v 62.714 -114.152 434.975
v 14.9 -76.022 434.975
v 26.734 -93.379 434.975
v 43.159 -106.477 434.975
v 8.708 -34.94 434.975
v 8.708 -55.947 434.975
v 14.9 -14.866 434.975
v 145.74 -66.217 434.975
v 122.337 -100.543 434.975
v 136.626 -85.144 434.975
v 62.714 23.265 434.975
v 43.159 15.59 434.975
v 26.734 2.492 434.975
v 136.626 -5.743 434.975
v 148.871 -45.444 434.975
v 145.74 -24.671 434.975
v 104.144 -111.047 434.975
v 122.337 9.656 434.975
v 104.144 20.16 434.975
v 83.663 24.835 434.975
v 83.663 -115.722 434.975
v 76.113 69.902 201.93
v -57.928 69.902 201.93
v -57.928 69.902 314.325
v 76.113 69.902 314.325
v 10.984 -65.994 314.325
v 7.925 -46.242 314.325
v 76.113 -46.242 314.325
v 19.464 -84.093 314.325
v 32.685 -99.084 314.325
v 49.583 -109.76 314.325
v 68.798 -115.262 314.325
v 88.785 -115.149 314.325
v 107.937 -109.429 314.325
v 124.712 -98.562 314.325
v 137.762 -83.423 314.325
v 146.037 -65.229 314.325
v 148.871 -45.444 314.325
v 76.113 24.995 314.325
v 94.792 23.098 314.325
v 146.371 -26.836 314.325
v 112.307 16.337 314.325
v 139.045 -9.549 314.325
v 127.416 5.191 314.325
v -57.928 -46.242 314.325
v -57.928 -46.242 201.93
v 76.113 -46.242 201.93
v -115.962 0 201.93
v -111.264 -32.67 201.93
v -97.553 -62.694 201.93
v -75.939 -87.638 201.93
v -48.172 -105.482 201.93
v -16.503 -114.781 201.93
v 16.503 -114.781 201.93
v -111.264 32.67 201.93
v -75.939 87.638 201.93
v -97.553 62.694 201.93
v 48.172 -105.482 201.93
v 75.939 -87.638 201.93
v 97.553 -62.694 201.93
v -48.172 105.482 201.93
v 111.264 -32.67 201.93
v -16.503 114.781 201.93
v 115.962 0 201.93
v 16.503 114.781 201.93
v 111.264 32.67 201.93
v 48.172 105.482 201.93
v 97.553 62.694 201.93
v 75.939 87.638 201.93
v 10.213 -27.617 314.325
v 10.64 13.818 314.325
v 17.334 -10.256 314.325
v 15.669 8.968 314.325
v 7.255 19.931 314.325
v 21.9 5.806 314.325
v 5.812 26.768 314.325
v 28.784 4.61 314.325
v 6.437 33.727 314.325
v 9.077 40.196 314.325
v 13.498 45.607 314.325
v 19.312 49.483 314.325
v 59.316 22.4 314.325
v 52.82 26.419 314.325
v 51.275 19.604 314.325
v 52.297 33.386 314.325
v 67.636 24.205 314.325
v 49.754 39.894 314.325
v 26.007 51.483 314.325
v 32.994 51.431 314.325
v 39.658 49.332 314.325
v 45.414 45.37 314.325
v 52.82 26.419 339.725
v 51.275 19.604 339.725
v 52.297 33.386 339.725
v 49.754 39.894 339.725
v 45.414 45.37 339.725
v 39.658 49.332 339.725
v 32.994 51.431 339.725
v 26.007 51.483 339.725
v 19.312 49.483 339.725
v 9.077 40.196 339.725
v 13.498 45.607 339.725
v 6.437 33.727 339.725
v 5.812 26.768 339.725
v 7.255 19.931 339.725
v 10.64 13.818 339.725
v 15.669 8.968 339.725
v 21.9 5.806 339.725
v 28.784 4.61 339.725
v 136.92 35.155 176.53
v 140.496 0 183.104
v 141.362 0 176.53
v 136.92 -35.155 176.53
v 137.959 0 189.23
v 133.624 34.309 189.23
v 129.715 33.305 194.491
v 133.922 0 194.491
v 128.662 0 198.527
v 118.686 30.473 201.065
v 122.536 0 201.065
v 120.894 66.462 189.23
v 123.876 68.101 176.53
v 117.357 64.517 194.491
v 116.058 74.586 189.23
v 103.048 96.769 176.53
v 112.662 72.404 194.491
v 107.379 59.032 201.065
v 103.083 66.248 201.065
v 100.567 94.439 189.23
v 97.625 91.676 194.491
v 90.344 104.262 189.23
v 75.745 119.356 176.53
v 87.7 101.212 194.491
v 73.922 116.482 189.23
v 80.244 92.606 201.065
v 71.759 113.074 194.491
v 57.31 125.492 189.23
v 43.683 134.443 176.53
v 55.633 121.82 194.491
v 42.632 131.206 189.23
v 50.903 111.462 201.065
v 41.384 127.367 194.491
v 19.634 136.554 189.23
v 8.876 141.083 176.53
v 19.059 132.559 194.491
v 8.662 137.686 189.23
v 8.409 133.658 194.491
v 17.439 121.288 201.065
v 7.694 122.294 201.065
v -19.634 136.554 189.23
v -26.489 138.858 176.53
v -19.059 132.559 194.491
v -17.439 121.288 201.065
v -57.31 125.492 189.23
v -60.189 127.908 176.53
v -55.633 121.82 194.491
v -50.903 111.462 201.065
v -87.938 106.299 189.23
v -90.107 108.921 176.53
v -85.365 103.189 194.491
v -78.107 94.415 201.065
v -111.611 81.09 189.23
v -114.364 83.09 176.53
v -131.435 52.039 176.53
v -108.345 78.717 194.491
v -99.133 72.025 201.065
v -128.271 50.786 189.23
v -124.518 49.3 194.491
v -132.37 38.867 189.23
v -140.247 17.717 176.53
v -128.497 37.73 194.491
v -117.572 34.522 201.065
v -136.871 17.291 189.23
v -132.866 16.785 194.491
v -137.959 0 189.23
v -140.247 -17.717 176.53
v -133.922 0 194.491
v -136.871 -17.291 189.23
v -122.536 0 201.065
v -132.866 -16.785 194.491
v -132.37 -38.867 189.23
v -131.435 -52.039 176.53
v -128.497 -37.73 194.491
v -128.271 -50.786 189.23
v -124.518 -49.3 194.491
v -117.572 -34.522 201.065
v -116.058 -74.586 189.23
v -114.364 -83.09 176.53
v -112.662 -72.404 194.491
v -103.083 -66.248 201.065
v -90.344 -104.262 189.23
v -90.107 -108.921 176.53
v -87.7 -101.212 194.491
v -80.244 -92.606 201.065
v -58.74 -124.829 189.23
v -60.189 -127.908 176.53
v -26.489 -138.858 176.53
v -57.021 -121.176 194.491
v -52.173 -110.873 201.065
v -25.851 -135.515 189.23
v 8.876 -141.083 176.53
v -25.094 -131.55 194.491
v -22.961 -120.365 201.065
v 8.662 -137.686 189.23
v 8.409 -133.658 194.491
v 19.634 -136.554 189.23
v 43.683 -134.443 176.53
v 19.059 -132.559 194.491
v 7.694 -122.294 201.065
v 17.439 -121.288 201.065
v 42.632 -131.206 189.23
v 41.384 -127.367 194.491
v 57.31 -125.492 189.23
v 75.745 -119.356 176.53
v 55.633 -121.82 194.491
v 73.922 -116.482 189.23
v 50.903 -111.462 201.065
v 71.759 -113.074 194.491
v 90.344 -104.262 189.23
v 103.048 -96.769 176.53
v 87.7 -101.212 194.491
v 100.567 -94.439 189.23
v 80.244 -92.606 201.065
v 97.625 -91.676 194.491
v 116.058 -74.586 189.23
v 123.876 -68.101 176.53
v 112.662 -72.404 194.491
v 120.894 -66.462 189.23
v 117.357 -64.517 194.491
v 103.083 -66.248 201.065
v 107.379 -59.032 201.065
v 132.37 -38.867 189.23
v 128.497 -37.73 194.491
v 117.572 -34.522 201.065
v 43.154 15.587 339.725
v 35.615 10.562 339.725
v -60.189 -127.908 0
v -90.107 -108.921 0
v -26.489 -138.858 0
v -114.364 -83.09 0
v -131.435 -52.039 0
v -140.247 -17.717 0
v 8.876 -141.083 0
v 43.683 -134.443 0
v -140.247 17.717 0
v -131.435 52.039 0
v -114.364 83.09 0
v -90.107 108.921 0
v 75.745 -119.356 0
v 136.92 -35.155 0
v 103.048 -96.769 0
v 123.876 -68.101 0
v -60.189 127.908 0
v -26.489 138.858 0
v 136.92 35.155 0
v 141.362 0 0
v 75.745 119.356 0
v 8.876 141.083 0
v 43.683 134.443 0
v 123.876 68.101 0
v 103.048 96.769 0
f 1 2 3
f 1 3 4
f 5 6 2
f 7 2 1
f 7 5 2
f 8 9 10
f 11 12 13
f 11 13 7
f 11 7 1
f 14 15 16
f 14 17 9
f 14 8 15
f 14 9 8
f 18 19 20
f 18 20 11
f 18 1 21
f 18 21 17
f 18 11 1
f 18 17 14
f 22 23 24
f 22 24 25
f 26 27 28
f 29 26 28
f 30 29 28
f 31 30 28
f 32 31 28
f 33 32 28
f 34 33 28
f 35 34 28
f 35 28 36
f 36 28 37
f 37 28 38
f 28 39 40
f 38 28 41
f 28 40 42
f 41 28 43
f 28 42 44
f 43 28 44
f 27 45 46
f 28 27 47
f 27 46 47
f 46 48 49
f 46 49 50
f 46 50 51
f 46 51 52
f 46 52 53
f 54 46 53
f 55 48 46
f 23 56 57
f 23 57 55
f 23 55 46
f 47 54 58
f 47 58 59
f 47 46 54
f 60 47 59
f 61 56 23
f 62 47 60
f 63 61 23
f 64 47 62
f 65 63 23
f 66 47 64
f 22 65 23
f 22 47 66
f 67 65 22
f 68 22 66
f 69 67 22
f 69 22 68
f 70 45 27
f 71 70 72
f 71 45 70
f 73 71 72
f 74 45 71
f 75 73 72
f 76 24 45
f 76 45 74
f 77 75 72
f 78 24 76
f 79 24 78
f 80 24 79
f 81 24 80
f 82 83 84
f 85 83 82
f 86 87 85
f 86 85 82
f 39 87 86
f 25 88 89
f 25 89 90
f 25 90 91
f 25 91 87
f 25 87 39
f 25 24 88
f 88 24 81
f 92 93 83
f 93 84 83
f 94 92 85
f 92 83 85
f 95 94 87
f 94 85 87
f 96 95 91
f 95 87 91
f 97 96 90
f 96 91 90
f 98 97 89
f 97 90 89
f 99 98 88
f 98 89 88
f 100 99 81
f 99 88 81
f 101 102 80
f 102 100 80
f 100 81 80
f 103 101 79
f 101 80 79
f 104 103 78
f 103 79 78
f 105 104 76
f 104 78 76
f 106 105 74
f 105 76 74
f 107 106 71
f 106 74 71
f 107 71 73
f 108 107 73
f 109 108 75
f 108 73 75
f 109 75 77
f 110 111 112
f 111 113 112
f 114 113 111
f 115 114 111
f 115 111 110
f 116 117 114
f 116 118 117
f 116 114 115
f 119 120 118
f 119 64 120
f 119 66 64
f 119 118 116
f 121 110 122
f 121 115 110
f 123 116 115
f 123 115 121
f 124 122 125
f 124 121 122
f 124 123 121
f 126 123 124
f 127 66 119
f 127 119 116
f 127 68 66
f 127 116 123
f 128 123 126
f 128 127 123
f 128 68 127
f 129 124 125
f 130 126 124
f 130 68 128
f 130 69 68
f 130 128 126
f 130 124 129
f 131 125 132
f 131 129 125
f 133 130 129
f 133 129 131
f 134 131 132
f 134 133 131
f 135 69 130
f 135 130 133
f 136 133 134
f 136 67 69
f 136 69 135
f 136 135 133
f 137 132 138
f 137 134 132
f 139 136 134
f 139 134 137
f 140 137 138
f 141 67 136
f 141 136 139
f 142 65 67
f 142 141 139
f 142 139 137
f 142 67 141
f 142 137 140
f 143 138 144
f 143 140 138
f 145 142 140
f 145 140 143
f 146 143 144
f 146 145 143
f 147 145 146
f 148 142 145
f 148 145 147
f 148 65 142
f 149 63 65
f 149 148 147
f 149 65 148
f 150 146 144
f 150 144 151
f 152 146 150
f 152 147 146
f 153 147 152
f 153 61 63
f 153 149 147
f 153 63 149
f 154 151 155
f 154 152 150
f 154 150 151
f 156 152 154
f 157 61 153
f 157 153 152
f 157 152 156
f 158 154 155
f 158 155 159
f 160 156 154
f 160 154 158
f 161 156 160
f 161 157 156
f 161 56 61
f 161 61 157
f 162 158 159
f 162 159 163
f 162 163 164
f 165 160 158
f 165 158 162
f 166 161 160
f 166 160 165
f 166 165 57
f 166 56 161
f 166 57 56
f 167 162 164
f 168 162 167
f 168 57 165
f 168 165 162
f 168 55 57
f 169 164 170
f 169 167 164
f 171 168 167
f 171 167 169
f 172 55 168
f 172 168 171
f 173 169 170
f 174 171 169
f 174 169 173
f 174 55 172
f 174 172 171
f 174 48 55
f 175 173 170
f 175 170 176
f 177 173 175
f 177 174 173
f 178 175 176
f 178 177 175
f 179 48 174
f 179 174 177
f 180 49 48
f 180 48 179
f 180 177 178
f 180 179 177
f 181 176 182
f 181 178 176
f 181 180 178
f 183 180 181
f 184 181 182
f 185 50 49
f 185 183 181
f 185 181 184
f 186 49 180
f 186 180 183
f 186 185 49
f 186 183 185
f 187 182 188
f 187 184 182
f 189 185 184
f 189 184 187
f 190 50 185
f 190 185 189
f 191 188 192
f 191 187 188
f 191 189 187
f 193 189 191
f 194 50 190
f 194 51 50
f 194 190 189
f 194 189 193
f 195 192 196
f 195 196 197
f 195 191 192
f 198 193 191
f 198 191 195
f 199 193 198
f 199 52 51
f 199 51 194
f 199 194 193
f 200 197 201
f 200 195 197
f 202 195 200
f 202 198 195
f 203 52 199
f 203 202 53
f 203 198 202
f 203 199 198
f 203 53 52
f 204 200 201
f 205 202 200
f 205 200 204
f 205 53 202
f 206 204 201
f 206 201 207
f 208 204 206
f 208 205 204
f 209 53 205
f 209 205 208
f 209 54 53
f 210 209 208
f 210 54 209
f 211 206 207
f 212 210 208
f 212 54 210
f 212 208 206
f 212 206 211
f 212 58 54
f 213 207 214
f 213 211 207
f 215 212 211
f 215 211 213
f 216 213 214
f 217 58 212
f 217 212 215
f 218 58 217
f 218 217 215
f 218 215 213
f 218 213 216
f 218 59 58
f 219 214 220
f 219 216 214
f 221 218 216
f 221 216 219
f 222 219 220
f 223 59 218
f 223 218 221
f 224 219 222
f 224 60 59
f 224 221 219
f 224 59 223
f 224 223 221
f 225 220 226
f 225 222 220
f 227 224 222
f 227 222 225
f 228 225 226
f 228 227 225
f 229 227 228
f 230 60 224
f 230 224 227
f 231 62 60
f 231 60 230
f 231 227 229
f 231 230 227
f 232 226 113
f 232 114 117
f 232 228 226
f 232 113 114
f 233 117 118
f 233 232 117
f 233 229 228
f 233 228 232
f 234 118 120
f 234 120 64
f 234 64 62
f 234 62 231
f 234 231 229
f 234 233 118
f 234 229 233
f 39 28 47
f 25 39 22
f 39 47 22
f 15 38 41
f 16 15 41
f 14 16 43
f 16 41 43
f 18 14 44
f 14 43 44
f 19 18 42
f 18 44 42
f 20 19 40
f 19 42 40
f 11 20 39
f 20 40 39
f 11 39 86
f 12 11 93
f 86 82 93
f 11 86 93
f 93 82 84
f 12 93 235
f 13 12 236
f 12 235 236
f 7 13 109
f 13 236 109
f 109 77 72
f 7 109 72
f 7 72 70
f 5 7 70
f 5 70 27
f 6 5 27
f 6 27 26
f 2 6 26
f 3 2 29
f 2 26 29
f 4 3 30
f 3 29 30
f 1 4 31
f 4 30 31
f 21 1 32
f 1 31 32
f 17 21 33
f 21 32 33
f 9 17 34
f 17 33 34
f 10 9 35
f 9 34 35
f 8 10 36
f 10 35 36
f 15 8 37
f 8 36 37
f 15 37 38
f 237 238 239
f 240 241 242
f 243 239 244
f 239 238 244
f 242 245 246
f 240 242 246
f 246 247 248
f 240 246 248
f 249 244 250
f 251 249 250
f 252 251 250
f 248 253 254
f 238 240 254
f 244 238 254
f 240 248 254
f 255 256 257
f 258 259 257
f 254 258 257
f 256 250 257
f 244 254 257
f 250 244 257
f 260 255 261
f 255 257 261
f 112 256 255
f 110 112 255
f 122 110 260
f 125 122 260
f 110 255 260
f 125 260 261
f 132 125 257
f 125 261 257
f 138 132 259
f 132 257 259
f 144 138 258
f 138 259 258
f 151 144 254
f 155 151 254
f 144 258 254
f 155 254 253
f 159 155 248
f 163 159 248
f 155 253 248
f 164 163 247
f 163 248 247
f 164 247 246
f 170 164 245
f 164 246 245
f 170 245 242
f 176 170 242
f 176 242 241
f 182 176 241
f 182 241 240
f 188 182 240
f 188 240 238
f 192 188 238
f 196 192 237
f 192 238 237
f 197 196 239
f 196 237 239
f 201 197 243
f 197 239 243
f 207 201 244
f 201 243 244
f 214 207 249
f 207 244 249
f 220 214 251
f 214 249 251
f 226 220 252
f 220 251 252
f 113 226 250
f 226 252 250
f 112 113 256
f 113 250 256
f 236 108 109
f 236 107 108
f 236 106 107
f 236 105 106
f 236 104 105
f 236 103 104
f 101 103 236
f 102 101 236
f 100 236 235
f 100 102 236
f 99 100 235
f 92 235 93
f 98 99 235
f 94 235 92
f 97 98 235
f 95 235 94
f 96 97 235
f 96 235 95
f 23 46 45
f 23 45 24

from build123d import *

# Parameters (mm, degrees)
F0_R      = 141.361555
F1_DEPTH  = 201.93
F3_W      = 134.041112
F3_H      = 116.143879
F4_DEPTH  = 112.395
F5_R      = 25.4
F7_R      = 23.556914
F8_DEPTH  = 25.4
F9_R      = 70.475259
F10_DEPTH = 120.65


with BuildPart() as f1:
    # F0 (on Top) → F1 (new body)
    with BuildSketch(Plane.XY):
        Circle(F0_R)
    extrude(amount=F1_DEPTH)

    # F3 (on face) → F4 (join)
    with BuildSketch(Plane.XY.offset(201.93)):
        with Locations((9.092184, 11.829982)):
            Rectangle(F3_W, F3_H)
    extrude(amount=F4_DEPTH)

    # F5
    f5_edges = [f1.edges().sort_by_distance(p)[0] for p in [
        (-141.361555, 0, 201.93),
    ]]
    fillet(f5_edges, radius=F5_R)

    # F7 (on face) → F8 (join)
    with BuildSketch(Plane.XY.offset(314.325)):
        with Locations((29.327184, 28.160922)):
            Circle(F7_R)
    extrude(amount=F8_DEPTH)

    # F9 (on face) → F10 (join)
    with BuildSketch(Plane.XY.offset(314.325)):
        with Locations((78.396186, -45.443591)):
            Circle(F9_R)
    extrude(amount=F10_DEPTH)


solid = f1.part
